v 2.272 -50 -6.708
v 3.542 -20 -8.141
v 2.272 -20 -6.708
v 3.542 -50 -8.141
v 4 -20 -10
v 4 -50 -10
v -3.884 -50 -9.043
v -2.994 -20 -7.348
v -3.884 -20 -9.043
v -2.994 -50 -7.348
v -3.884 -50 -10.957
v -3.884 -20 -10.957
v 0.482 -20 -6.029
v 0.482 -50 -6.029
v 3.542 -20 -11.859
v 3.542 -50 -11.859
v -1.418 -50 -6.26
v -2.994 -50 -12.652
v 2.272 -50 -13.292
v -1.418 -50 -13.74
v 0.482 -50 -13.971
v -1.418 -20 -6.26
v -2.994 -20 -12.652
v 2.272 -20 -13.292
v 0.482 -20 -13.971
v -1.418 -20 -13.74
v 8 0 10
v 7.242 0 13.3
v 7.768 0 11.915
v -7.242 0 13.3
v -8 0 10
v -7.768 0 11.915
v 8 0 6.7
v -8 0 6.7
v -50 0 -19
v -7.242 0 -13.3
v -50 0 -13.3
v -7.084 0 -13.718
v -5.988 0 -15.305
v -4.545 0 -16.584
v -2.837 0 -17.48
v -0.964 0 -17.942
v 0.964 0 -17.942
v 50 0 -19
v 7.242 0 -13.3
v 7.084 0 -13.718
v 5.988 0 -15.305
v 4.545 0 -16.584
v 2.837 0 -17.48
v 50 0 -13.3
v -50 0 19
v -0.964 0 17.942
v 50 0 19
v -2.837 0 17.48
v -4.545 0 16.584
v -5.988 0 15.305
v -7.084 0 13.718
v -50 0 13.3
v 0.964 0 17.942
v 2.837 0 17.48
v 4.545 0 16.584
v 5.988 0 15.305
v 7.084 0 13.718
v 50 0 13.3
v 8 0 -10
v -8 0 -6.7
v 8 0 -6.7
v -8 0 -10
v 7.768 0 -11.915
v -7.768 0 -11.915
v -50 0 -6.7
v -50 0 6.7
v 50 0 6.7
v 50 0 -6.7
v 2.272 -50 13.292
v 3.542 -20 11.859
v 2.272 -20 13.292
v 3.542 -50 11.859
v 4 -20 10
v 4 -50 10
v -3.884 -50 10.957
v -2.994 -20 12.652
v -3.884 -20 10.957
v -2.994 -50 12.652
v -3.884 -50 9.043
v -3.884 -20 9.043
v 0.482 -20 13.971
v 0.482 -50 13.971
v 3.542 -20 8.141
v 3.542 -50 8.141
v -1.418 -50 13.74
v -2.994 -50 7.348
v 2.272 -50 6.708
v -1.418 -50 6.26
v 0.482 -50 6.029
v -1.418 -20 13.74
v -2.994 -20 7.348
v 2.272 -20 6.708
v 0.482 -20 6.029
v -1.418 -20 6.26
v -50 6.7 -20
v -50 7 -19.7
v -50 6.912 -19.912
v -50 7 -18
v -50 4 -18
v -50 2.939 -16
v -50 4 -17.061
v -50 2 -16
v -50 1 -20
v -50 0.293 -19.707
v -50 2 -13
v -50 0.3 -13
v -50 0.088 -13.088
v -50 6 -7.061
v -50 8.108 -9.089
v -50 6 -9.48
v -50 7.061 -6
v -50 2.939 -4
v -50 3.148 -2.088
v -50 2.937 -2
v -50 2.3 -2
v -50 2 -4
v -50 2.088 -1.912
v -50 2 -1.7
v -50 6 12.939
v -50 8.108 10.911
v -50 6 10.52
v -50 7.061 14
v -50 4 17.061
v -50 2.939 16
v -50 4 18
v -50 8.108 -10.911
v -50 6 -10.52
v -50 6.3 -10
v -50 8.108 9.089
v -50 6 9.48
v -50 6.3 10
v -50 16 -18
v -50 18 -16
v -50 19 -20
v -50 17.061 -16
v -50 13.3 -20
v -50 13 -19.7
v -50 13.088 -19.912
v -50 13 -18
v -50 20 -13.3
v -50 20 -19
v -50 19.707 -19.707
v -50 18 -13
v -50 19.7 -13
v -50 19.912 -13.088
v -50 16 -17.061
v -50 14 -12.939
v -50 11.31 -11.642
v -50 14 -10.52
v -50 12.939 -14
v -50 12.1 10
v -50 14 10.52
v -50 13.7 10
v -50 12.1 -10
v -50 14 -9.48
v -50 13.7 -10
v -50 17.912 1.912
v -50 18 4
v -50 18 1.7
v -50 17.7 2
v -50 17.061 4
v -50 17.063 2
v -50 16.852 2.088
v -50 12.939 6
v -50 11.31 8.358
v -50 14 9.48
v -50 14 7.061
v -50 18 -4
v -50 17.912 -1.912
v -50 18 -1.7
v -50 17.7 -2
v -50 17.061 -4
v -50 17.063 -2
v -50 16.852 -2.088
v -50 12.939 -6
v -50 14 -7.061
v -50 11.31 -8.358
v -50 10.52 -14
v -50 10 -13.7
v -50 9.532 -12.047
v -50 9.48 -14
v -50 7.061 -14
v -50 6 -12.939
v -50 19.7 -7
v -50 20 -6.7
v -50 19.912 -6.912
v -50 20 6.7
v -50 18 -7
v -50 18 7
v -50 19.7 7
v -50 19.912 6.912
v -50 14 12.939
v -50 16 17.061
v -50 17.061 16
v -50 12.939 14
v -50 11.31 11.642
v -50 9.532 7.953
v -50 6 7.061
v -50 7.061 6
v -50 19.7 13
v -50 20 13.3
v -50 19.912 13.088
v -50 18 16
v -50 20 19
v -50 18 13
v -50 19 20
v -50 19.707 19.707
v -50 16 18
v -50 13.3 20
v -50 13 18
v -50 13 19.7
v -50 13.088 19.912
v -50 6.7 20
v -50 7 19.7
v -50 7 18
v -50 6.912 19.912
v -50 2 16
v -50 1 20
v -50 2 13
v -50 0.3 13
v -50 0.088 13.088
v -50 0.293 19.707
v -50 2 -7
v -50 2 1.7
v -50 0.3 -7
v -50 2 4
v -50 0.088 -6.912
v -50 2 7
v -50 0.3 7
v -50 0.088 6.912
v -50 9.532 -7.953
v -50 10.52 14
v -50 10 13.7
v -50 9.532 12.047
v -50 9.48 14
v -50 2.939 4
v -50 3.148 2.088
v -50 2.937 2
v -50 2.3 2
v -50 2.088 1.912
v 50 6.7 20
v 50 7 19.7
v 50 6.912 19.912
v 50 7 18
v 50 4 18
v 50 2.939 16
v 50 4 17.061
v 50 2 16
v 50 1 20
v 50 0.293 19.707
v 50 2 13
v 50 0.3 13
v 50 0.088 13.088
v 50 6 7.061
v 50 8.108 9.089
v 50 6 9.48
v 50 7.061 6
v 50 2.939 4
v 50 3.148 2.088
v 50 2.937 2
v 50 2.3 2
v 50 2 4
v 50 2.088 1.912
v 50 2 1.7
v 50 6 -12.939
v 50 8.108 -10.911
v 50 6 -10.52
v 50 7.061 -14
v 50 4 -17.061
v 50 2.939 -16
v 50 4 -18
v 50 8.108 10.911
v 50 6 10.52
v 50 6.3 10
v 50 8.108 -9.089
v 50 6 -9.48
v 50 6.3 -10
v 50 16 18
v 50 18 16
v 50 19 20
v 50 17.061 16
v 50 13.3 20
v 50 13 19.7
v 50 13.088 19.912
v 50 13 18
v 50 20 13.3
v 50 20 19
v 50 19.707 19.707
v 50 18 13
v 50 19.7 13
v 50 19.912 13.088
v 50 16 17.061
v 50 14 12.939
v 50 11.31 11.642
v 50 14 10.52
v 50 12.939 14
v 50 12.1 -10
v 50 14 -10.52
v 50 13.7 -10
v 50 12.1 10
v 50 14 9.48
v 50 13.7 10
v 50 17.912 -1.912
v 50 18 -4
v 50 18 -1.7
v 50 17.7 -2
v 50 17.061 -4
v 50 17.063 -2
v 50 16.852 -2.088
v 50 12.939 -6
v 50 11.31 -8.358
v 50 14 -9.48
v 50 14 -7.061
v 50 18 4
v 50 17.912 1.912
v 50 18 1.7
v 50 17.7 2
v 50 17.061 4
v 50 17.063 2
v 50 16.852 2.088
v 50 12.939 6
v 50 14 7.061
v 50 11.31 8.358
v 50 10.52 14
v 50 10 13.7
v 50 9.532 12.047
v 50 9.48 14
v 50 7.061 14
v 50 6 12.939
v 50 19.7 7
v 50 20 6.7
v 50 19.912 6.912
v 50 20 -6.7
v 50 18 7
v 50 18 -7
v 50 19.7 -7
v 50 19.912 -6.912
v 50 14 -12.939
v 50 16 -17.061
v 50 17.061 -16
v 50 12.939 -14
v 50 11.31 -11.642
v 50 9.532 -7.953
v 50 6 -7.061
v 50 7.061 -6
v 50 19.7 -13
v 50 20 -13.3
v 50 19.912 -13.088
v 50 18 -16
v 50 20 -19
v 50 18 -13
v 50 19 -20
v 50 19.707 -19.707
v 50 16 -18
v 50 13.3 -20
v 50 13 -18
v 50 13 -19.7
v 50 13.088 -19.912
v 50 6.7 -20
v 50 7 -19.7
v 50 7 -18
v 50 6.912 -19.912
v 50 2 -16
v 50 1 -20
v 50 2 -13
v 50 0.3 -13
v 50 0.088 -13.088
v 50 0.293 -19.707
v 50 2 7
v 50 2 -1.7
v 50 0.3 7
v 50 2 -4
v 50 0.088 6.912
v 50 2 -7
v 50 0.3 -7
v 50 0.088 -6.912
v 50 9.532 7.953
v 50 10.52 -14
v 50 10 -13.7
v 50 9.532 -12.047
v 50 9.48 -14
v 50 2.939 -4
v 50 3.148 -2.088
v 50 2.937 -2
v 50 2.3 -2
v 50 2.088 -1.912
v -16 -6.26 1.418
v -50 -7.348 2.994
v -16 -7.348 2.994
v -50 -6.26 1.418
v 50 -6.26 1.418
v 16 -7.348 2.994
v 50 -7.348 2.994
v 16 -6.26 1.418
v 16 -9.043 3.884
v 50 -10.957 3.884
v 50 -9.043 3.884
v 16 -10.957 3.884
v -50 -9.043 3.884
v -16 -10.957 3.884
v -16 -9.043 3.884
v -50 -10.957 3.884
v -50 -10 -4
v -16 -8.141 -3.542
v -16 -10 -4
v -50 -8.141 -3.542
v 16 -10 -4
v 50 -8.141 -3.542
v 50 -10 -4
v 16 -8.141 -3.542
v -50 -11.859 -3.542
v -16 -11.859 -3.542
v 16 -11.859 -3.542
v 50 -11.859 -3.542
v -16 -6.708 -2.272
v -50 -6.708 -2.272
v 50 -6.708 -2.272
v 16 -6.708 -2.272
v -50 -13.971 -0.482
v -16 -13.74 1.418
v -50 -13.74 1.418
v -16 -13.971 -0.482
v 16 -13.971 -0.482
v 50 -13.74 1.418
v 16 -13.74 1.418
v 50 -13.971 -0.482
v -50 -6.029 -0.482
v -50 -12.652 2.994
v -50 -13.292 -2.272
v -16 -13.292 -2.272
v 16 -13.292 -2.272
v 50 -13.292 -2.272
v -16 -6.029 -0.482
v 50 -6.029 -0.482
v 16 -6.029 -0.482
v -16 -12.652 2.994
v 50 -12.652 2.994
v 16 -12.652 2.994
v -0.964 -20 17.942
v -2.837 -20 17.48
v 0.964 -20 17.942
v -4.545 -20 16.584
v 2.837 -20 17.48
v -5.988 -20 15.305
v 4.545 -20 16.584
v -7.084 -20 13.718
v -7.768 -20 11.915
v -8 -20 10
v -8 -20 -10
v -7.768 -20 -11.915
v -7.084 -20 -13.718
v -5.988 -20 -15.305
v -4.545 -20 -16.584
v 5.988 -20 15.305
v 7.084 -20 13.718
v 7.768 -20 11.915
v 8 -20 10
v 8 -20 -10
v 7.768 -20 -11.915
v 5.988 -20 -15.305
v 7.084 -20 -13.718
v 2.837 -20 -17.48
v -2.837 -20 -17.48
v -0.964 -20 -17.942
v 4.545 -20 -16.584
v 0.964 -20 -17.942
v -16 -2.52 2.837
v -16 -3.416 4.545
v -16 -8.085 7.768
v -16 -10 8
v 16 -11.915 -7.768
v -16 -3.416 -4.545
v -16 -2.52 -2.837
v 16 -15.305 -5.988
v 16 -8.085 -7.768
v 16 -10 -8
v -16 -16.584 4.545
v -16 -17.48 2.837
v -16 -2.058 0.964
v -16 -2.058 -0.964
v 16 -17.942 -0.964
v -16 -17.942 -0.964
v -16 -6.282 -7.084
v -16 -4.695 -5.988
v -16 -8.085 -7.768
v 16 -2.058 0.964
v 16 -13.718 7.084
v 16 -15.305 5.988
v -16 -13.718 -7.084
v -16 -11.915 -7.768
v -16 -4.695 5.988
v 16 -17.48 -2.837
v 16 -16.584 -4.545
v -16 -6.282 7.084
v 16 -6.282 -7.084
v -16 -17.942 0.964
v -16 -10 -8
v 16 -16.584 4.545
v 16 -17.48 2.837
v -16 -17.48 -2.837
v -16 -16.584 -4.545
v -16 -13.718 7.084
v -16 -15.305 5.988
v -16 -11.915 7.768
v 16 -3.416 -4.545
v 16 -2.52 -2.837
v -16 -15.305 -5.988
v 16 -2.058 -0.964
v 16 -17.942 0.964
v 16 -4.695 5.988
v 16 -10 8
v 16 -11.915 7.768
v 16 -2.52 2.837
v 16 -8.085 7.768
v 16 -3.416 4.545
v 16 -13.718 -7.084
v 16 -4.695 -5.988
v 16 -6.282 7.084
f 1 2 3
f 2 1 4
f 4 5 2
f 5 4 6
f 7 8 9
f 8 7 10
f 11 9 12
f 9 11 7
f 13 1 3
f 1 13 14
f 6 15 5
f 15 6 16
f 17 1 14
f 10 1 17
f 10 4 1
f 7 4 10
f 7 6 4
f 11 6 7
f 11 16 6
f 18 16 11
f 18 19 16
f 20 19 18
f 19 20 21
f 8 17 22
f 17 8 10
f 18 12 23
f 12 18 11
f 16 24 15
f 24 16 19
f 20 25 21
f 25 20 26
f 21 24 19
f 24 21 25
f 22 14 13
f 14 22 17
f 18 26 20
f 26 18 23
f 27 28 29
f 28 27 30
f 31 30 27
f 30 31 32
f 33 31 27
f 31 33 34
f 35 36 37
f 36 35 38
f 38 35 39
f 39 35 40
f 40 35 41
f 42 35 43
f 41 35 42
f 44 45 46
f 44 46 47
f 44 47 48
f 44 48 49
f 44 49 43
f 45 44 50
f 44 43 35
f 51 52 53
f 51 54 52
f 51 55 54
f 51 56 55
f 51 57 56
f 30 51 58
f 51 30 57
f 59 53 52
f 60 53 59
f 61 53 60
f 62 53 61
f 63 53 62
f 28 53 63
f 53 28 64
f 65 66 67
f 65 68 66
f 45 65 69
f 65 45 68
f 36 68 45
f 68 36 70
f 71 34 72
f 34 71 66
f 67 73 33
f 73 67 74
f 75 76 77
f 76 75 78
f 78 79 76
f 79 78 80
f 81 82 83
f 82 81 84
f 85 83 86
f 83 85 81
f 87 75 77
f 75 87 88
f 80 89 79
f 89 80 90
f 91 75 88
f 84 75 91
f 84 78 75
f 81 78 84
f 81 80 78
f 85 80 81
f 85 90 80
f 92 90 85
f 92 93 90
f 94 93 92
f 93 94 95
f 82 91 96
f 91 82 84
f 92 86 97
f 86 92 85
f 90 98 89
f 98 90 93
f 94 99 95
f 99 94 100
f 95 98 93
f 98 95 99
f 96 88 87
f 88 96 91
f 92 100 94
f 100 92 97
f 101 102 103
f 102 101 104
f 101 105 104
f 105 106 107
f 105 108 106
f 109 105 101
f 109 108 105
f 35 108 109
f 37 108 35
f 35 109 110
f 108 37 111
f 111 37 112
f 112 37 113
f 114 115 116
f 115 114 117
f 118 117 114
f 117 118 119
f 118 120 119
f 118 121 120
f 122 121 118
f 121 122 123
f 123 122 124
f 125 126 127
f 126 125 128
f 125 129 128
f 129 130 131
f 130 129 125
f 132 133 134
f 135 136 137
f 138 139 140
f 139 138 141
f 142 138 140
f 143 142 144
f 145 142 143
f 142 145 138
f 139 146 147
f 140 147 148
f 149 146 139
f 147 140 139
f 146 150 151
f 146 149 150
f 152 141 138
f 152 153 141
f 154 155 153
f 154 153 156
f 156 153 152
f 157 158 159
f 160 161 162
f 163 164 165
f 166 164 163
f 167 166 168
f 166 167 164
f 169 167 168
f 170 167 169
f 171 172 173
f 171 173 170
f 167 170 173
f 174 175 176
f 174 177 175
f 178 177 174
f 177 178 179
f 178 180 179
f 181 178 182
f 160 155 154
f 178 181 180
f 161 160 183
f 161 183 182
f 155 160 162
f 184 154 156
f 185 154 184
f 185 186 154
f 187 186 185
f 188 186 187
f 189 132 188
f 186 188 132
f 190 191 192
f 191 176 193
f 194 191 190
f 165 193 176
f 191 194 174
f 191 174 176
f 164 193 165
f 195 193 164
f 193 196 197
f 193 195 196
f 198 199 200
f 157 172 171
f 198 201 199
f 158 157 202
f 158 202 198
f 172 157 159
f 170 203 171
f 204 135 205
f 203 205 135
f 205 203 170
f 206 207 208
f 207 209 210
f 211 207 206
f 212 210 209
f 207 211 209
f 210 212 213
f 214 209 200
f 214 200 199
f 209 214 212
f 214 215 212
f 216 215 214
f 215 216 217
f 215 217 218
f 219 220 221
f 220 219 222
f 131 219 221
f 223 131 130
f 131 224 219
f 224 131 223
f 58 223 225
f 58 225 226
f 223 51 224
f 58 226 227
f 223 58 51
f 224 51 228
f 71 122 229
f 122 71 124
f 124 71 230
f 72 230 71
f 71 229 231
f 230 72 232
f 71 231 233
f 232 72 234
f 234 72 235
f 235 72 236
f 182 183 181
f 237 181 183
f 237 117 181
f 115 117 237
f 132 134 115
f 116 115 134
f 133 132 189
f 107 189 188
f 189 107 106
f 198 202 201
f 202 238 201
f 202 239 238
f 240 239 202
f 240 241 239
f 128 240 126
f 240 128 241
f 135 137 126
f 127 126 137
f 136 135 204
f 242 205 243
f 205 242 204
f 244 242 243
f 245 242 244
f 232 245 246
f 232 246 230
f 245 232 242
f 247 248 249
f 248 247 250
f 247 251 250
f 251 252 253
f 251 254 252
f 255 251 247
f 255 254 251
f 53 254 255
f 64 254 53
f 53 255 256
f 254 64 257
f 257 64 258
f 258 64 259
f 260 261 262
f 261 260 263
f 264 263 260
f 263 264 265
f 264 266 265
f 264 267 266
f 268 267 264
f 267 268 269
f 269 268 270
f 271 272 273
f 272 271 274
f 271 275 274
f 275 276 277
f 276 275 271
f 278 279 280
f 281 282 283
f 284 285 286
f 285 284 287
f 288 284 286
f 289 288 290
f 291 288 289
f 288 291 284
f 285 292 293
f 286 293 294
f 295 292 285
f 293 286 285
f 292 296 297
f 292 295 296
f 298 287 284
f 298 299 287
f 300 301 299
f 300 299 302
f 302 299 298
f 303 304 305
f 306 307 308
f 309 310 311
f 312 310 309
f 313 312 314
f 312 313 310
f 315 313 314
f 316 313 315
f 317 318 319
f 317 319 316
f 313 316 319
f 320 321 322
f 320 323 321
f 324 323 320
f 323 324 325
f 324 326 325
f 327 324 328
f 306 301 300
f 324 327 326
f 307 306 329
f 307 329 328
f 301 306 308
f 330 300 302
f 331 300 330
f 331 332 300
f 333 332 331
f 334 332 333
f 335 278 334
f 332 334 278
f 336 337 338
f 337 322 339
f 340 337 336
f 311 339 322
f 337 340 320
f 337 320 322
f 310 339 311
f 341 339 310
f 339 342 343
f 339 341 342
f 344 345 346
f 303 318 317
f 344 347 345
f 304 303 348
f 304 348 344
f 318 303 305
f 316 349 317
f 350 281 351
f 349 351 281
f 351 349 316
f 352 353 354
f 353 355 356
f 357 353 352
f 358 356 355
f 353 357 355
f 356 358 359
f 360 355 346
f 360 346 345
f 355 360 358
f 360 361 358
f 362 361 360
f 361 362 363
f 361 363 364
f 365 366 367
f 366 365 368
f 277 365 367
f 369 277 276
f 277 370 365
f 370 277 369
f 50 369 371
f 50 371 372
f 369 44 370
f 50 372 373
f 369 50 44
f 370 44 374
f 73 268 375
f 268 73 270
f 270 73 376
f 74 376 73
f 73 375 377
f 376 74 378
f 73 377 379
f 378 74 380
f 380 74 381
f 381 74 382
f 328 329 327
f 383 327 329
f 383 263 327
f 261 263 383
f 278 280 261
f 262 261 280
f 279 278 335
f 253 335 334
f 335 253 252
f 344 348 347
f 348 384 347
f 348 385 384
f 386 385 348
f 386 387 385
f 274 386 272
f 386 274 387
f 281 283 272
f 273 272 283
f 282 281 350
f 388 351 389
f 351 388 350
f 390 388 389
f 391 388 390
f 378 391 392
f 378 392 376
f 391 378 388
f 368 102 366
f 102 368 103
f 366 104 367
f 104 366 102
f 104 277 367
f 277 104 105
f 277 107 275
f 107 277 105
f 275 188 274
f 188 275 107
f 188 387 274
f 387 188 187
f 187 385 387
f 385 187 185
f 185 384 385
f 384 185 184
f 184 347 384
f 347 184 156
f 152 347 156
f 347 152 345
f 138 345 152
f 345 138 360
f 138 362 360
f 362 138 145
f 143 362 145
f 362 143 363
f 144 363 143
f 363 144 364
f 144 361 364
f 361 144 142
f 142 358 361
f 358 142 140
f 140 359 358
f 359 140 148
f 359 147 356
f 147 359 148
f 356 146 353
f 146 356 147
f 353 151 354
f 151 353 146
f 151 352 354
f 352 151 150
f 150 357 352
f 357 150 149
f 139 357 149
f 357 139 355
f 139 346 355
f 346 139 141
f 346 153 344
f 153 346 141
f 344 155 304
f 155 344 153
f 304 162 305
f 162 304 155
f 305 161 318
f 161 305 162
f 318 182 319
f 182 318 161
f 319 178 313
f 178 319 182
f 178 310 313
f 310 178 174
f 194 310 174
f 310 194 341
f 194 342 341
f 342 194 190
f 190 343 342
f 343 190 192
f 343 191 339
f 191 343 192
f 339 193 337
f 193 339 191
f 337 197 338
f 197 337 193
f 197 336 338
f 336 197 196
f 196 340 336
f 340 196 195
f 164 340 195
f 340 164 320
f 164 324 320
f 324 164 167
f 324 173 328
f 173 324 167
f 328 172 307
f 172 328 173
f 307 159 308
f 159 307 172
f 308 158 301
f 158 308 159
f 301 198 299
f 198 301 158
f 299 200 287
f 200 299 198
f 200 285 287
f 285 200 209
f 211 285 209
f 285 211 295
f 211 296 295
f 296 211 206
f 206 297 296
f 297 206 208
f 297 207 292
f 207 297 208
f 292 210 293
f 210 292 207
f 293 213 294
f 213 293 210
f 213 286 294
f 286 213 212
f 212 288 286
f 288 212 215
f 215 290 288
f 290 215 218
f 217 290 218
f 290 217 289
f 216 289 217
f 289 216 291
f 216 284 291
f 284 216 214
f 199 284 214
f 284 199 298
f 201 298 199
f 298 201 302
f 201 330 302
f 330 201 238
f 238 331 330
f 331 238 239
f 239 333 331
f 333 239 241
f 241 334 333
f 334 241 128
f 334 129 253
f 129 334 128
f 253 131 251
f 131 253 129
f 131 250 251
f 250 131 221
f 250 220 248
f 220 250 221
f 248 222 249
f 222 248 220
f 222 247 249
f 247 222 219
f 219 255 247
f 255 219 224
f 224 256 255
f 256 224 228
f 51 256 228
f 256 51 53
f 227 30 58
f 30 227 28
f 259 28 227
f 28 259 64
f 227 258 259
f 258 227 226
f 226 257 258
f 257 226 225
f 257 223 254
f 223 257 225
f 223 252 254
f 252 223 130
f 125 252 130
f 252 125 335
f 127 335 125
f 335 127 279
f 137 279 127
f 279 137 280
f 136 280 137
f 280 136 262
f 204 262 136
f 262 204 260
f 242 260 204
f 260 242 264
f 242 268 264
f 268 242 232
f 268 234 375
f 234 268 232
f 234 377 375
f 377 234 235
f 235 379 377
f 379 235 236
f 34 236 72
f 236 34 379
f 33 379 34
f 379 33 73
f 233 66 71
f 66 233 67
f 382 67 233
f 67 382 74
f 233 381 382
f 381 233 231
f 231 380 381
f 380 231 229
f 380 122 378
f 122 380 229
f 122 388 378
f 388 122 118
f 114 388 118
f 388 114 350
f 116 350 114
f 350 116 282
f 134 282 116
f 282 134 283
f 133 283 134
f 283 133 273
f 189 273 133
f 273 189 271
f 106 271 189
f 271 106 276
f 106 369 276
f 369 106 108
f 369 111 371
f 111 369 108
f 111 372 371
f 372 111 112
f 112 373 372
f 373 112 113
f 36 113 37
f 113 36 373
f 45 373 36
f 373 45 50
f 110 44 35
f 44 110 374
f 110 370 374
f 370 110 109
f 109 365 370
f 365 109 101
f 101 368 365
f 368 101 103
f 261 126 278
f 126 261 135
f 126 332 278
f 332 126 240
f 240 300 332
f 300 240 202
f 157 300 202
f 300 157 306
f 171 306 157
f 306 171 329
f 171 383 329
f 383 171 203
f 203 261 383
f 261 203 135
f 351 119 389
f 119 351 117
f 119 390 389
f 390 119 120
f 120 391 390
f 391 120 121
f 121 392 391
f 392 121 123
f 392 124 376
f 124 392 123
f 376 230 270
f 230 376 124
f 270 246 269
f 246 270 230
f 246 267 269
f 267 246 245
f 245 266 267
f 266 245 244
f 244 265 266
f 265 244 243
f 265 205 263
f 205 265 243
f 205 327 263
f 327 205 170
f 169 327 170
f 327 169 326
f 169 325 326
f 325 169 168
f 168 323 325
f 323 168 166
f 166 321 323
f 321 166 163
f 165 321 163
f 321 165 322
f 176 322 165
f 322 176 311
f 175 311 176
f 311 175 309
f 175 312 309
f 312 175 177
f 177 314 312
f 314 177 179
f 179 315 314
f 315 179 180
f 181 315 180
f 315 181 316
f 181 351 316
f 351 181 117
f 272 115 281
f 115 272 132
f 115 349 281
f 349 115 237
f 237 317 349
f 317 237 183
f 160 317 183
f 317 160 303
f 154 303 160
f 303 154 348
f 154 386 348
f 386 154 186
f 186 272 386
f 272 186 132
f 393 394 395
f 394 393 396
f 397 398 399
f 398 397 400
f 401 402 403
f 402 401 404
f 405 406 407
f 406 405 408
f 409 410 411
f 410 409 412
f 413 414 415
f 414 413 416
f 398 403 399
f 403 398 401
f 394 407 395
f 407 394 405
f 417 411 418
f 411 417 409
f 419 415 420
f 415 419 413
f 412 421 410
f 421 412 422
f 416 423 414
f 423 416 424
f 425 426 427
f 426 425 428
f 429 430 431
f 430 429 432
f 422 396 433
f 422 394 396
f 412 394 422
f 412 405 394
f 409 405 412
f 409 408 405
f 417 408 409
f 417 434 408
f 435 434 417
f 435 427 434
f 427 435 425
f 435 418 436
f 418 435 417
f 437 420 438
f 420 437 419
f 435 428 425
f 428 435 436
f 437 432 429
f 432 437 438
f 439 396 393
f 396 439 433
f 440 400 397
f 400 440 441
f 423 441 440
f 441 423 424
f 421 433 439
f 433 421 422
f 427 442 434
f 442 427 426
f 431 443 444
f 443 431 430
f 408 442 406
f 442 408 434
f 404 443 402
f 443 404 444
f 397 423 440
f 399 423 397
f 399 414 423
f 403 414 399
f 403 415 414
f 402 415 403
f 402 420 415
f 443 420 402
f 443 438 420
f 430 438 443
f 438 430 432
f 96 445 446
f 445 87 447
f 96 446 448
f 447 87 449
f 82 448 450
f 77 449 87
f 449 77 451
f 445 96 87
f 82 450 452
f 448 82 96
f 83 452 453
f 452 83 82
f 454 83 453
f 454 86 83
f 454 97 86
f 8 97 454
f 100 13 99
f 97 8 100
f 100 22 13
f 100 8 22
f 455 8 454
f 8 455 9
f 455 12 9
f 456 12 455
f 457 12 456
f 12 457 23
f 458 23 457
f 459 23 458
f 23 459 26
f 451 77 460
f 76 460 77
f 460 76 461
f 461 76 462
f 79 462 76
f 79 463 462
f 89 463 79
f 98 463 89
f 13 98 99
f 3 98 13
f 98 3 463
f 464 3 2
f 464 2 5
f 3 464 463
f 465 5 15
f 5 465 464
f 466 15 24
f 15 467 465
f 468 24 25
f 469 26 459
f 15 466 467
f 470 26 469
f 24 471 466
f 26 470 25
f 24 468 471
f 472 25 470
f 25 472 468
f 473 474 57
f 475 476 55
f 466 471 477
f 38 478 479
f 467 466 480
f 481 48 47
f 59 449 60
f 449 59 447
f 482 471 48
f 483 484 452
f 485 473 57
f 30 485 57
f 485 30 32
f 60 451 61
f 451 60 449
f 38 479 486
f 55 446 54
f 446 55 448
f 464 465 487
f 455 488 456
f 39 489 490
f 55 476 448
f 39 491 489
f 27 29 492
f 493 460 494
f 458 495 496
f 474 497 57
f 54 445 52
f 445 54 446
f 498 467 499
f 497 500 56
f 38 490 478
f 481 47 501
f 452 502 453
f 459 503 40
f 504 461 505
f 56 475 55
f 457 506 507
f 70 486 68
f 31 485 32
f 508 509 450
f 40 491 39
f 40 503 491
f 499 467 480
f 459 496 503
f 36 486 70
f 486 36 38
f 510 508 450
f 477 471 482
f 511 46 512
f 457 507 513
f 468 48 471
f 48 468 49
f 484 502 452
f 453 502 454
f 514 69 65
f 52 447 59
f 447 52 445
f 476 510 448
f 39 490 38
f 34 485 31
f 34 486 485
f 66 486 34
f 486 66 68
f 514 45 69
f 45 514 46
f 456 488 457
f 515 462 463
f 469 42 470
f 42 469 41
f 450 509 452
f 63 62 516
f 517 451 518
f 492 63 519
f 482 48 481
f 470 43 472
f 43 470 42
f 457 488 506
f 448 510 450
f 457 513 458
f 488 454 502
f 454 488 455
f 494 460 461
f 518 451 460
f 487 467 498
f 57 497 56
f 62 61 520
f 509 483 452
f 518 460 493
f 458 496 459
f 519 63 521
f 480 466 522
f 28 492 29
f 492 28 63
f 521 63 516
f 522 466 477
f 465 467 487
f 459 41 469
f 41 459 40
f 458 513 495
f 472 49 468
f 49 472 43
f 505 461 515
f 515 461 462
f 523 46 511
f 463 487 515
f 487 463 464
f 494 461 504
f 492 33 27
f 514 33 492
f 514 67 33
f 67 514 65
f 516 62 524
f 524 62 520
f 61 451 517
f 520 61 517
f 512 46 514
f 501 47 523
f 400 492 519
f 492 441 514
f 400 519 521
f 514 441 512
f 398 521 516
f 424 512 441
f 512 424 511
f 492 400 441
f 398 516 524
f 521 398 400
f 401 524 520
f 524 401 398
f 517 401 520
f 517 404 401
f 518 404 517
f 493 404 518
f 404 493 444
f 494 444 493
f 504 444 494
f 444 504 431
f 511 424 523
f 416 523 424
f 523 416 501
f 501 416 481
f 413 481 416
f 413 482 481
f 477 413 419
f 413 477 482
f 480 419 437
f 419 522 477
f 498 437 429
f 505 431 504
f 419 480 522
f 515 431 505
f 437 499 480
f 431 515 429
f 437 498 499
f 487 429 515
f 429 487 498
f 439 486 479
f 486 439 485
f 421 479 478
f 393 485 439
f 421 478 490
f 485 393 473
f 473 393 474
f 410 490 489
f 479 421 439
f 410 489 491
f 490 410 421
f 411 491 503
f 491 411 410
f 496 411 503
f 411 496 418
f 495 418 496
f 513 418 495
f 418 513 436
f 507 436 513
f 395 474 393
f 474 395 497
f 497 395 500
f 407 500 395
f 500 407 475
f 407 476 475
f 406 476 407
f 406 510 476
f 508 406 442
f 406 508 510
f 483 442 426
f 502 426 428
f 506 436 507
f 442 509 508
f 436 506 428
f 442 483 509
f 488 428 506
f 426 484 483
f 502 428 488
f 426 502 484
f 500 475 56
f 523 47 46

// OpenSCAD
// file: Library/20x40.scad
module 20x40(L = 50, center = false, massive = false) {
color("silver")
if (center == true)
{
	if (massive == true) {
		cube (size = [L, 20, 40], center = true);
	} else { 
		rotate([90, 0, 90]) {
			linear_extrude(height = L, center = center, convexity = 10)
			import (file = "HFSB5-2040-50_view1_AUTOCAD_VERSION_2013.dxf");
		}
	}
} else {
	if (massive == true) {
		translate ([0, -10, 0]) cube (size = [L, 20, 40], center = false);
	} else {
		translate([0,0,20]) rotate([90, 0, 90]) {
			linear_extrude(height = L, center = center, convexity = 10)
			import (file = "HFSB5-2040-50_view1_AUTOCAD_VERSION_2013.dxf");
		}
	}
}
}

20x40(center = true, massive = false);
// main file
use <Library/20x40.scad>

module demo_render(demo_length = 100)
{
    translate([0,10,0])
        20x40(center=true, L=demo_length);

    color("gray")
        translate([0,-10,0])
        rotate([0,90,0])
        cylinder(r=8/2, h=demo_length, center=true);

    for(j=[-1,1])
        color("gray")
            translate([0,0,10*j])
            rotate([90,0,0])
            cylinder(r=8/2, h=demo_length/2);
}

module xy_connect()
{
    // TODO: Mount bearings and stuff
    difference()
    {
        hull()
        {
            translate([0,-10,0])
                rotate([0,90,0])
                cylinder(r=16/2, h=16*2, center=true);

            for(j=[-1,1])
                translate([0,0,10*j])
                    rotate([90,0,0])
                    cylinder(r=16/2, h=20);
        }
        translate([0,-10,0])
            rotate([0,90,0])
            cylinder(r=8/2, h=16*2, center=true);

        for(j=[-1,1])
            translate([0,0,10*j])
                rotate([90,0,0])
                cylinder(r=8/2, h=20);

    }

}

demo_render(100);
xy_connect();
